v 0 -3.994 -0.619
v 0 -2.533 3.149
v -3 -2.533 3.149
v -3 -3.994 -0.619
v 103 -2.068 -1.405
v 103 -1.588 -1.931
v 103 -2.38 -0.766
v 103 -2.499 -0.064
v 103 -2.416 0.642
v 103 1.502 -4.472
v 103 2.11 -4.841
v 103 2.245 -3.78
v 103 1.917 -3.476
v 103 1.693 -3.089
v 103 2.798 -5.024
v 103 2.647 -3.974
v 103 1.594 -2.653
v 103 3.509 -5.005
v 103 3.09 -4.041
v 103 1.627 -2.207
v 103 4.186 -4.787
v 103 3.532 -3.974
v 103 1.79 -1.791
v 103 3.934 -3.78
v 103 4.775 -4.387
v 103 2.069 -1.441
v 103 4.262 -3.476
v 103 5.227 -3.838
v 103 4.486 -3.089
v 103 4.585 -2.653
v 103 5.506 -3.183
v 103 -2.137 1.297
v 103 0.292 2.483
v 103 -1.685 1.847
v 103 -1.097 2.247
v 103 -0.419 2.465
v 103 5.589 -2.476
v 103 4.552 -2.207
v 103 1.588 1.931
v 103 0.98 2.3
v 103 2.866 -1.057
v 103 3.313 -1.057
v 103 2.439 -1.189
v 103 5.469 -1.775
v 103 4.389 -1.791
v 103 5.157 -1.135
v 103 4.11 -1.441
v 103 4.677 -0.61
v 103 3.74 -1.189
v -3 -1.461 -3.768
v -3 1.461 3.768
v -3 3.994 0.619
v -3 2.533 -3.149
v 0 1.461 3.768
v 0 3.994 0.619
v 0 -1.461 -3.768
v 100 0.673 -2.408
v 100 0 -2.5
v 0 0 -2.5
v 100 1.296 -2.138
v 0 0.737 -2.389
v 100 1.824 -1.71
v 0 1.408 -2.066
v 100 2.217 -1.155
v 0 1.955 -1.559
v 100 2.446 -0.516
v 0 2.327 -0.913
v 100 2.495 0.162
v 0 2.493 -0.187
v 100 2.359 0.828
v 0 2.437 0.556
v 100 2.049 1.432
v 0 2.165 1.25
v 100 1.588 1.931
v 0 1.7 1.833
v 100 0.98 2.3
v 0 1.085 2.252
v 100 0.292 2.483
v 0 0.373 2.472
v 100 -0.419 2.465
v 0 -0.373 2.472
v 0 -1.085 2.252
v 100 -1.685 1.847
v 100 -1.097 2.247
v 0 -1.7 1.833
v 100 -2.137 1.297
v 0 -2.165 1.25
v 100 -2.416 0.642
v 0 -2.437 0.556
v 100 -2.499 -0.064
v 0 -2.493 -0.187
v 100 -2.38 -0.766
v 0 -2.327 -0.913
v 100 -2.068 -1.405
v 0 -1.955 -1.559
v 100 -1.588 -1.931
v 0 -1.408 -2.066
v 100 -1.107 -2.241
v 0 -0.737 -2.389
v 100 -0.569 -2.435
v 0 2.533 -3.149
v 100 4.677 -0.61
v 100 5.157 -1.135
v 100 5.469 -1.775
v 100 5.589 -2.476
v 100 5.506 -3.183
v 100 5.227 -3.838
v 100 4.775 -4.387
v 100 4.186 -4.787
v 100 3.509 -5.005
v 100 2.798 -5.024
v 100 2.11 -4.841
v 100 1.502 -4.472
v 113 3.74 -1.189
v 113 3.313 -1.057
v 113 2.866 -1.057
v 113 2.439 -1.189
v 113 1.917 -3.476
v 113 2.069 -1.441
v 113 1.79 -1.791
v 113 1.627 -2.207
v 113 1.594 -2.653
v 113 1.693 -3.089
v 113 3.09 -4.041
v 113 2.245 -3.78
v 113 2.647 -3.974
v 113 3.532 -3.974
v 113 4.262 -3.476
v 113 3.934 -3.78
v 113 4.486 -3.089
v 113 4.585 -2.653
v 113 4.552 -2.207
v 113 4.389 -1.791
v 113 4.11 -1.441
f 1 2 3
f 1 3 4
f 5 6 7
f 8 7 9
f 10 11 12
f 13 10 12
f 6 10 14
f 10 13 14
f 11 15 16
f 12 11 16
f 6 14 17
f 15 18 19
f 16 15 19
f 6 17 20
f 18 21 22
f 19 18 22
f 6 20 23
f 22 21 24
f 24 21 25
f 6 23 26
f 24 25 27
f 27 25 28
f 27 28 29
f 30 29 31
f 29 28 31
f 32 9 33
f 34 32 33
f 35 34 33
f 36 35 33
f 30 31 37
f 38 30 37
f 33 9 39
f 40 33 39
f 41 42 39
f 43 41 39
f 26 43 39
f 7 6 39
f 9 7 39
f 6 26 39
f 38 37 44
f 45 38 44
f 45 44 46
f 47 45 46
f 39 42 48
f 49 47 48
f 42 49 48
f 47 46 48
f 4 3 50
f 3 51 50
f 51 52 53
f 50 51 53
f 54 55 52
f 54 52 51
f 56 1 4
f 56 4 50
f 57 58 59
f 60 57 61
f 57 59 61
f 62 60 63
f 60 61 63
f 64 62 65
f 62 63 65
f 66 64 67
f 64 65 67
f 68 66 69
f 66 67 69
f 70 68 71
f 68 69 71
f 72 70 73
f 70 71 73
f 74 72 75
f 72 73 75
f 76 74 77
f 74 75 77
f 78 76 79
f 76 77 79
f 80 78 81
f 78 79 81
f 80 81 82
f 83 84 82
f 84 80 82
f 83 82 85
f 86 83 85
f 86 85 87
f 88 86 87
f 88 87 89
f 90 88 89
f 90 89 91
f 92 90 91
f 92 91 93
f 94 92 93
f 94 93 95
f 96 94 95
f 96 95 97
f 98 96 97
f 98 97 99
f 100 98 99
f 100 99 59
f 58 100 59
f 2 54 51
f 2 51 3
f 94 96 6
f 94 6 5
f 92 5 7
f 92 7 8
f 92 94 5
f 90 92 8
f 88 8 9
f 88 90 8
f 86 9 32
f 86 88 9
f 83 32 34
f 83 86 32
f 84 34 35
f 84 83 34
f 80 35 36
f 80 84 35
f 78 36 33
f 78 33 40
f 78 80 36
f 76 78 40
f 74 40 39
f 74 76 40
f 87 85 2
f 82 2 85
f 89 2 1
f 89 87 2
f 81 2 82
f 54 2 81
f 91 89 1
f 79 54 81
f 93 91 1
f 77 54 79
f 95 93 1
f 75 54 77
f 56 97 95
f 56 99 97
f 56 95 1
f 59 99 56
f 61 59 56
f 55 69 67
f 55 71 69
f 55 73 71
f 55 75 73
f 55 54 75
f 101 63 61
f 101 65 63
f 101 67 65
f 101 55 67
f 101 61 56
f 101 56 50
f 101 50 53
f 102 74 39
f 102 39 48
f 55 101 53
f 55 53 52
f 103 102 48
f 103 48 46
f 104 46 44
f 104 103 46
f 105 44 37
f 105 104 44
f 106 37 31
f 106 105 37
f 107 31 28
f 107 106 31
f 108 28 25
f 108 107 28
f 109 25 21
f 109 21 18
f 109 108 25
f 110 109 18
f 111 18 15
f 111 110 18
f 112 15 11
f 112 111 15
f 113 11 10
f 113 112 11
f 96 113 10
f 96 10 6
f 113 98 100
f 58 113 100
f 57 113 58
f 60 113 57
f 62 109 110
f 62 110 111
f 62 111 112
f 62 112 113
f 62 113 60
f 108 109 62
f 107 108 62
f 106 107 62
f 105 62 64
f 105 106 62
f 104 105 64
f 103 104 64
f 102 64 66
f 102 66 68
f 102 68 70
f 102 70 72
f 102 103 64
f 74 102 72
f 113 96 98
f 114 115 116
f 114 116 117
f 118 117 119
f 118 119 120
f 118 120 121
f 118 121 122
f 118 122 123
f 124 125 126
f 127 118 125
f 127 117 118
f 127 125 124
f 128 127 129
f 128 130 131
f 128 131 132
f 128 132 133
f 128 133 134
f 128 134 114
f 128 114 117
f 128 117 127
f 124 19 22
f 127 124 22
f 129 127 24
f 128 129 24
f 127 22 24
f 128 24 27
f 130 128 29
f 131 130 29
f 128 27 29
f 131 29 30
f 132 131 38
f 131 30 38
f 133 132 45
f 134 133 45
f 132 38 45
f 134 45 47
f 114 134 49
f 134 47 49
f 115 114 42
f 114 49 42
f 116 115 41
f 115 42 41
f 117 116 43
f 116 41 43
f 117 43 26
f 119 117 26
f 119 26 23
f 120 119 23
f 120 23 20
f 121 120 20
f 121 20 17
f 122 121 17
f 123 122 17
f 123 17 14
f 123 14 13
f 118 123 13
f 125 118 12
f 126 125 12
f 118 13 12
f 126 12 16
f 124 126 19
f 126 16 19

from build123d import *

# Parameters (mm, degrees)
SKETCH_1_R      = 2.5
EXTRUDE_1_DEPTH = 100
EXTRUDE_2_DEPTH = 3
SKETCH_3_R      = 1.5
EXTRUDE_3_DEPTH = 10
EXTRUDE_4_DEPTH = 3


with BuildPart() as part:
    # 草圖1 → 填料-伸長1 (new body)
    with BuildSketch(Plane(origin=(0, 0, 0), x_dir=(0, 0, -1), z_dir=(1, 0, 0))):
        Circle(SKETCH_1_R)
    extrude(amount=EXTRUDE_1_DEPTH)

    # 草圖2 → 填料-伸長2 (add)
    with BuildSketch(Plane(origin=(100, 0, 0), x_dir=(0, 0, -1), z_dir=(1, 0, 0))):
        with BuildLine():
            Line((-1.930937659, 1.587916798), (0.609729217, 4.677417052))
            ThreePointArc((0.609729217, 4.677417052), (4.128583674, 5.020437914), (4.471604535, 1.501583457))
            Line((4.471604535, 1.501583457), (1.930937659, -1.587916798))
            ThreePointArc((1.930937659, -1.587916798), (-1.587916798, -1.930937659), (-1.930937659, 1.587916798))
        make_face()
    extrude(amount=EXTRUDE_2_DEPTH)

    # 草圖3 → 填料-伸長3 (add)
    with BuildSketch(Plane(origin=(103, 0, 0), x_dir=(0, 0, -1), z_dir=(1, 0, 0))):
        with Locations((2.540666876, 3.089500255)):
            Circle(SKETCH_3_R)
    extrude(amount=EXTRUDE_3_DEPTH)

    # 草圖4 → 填料-伸長4 (add)
    with BuildSketch(Plane(origin=(0, 0, 0), x_dir=(0, 0, -1), z_dir=(1, 0, 0))):
        Polygon((-3.149027259, -2.533172054), (0.619277721, -3.993723631), (3.76830498, -1.460551577), (3.149027259, 2.533172054), (-0.619277721, 3.993723631), (-3.76830498, 1.460551577), align=None)
    extrude(amount=-EXTRUDE_4_DEPTH)


solid = part.part
